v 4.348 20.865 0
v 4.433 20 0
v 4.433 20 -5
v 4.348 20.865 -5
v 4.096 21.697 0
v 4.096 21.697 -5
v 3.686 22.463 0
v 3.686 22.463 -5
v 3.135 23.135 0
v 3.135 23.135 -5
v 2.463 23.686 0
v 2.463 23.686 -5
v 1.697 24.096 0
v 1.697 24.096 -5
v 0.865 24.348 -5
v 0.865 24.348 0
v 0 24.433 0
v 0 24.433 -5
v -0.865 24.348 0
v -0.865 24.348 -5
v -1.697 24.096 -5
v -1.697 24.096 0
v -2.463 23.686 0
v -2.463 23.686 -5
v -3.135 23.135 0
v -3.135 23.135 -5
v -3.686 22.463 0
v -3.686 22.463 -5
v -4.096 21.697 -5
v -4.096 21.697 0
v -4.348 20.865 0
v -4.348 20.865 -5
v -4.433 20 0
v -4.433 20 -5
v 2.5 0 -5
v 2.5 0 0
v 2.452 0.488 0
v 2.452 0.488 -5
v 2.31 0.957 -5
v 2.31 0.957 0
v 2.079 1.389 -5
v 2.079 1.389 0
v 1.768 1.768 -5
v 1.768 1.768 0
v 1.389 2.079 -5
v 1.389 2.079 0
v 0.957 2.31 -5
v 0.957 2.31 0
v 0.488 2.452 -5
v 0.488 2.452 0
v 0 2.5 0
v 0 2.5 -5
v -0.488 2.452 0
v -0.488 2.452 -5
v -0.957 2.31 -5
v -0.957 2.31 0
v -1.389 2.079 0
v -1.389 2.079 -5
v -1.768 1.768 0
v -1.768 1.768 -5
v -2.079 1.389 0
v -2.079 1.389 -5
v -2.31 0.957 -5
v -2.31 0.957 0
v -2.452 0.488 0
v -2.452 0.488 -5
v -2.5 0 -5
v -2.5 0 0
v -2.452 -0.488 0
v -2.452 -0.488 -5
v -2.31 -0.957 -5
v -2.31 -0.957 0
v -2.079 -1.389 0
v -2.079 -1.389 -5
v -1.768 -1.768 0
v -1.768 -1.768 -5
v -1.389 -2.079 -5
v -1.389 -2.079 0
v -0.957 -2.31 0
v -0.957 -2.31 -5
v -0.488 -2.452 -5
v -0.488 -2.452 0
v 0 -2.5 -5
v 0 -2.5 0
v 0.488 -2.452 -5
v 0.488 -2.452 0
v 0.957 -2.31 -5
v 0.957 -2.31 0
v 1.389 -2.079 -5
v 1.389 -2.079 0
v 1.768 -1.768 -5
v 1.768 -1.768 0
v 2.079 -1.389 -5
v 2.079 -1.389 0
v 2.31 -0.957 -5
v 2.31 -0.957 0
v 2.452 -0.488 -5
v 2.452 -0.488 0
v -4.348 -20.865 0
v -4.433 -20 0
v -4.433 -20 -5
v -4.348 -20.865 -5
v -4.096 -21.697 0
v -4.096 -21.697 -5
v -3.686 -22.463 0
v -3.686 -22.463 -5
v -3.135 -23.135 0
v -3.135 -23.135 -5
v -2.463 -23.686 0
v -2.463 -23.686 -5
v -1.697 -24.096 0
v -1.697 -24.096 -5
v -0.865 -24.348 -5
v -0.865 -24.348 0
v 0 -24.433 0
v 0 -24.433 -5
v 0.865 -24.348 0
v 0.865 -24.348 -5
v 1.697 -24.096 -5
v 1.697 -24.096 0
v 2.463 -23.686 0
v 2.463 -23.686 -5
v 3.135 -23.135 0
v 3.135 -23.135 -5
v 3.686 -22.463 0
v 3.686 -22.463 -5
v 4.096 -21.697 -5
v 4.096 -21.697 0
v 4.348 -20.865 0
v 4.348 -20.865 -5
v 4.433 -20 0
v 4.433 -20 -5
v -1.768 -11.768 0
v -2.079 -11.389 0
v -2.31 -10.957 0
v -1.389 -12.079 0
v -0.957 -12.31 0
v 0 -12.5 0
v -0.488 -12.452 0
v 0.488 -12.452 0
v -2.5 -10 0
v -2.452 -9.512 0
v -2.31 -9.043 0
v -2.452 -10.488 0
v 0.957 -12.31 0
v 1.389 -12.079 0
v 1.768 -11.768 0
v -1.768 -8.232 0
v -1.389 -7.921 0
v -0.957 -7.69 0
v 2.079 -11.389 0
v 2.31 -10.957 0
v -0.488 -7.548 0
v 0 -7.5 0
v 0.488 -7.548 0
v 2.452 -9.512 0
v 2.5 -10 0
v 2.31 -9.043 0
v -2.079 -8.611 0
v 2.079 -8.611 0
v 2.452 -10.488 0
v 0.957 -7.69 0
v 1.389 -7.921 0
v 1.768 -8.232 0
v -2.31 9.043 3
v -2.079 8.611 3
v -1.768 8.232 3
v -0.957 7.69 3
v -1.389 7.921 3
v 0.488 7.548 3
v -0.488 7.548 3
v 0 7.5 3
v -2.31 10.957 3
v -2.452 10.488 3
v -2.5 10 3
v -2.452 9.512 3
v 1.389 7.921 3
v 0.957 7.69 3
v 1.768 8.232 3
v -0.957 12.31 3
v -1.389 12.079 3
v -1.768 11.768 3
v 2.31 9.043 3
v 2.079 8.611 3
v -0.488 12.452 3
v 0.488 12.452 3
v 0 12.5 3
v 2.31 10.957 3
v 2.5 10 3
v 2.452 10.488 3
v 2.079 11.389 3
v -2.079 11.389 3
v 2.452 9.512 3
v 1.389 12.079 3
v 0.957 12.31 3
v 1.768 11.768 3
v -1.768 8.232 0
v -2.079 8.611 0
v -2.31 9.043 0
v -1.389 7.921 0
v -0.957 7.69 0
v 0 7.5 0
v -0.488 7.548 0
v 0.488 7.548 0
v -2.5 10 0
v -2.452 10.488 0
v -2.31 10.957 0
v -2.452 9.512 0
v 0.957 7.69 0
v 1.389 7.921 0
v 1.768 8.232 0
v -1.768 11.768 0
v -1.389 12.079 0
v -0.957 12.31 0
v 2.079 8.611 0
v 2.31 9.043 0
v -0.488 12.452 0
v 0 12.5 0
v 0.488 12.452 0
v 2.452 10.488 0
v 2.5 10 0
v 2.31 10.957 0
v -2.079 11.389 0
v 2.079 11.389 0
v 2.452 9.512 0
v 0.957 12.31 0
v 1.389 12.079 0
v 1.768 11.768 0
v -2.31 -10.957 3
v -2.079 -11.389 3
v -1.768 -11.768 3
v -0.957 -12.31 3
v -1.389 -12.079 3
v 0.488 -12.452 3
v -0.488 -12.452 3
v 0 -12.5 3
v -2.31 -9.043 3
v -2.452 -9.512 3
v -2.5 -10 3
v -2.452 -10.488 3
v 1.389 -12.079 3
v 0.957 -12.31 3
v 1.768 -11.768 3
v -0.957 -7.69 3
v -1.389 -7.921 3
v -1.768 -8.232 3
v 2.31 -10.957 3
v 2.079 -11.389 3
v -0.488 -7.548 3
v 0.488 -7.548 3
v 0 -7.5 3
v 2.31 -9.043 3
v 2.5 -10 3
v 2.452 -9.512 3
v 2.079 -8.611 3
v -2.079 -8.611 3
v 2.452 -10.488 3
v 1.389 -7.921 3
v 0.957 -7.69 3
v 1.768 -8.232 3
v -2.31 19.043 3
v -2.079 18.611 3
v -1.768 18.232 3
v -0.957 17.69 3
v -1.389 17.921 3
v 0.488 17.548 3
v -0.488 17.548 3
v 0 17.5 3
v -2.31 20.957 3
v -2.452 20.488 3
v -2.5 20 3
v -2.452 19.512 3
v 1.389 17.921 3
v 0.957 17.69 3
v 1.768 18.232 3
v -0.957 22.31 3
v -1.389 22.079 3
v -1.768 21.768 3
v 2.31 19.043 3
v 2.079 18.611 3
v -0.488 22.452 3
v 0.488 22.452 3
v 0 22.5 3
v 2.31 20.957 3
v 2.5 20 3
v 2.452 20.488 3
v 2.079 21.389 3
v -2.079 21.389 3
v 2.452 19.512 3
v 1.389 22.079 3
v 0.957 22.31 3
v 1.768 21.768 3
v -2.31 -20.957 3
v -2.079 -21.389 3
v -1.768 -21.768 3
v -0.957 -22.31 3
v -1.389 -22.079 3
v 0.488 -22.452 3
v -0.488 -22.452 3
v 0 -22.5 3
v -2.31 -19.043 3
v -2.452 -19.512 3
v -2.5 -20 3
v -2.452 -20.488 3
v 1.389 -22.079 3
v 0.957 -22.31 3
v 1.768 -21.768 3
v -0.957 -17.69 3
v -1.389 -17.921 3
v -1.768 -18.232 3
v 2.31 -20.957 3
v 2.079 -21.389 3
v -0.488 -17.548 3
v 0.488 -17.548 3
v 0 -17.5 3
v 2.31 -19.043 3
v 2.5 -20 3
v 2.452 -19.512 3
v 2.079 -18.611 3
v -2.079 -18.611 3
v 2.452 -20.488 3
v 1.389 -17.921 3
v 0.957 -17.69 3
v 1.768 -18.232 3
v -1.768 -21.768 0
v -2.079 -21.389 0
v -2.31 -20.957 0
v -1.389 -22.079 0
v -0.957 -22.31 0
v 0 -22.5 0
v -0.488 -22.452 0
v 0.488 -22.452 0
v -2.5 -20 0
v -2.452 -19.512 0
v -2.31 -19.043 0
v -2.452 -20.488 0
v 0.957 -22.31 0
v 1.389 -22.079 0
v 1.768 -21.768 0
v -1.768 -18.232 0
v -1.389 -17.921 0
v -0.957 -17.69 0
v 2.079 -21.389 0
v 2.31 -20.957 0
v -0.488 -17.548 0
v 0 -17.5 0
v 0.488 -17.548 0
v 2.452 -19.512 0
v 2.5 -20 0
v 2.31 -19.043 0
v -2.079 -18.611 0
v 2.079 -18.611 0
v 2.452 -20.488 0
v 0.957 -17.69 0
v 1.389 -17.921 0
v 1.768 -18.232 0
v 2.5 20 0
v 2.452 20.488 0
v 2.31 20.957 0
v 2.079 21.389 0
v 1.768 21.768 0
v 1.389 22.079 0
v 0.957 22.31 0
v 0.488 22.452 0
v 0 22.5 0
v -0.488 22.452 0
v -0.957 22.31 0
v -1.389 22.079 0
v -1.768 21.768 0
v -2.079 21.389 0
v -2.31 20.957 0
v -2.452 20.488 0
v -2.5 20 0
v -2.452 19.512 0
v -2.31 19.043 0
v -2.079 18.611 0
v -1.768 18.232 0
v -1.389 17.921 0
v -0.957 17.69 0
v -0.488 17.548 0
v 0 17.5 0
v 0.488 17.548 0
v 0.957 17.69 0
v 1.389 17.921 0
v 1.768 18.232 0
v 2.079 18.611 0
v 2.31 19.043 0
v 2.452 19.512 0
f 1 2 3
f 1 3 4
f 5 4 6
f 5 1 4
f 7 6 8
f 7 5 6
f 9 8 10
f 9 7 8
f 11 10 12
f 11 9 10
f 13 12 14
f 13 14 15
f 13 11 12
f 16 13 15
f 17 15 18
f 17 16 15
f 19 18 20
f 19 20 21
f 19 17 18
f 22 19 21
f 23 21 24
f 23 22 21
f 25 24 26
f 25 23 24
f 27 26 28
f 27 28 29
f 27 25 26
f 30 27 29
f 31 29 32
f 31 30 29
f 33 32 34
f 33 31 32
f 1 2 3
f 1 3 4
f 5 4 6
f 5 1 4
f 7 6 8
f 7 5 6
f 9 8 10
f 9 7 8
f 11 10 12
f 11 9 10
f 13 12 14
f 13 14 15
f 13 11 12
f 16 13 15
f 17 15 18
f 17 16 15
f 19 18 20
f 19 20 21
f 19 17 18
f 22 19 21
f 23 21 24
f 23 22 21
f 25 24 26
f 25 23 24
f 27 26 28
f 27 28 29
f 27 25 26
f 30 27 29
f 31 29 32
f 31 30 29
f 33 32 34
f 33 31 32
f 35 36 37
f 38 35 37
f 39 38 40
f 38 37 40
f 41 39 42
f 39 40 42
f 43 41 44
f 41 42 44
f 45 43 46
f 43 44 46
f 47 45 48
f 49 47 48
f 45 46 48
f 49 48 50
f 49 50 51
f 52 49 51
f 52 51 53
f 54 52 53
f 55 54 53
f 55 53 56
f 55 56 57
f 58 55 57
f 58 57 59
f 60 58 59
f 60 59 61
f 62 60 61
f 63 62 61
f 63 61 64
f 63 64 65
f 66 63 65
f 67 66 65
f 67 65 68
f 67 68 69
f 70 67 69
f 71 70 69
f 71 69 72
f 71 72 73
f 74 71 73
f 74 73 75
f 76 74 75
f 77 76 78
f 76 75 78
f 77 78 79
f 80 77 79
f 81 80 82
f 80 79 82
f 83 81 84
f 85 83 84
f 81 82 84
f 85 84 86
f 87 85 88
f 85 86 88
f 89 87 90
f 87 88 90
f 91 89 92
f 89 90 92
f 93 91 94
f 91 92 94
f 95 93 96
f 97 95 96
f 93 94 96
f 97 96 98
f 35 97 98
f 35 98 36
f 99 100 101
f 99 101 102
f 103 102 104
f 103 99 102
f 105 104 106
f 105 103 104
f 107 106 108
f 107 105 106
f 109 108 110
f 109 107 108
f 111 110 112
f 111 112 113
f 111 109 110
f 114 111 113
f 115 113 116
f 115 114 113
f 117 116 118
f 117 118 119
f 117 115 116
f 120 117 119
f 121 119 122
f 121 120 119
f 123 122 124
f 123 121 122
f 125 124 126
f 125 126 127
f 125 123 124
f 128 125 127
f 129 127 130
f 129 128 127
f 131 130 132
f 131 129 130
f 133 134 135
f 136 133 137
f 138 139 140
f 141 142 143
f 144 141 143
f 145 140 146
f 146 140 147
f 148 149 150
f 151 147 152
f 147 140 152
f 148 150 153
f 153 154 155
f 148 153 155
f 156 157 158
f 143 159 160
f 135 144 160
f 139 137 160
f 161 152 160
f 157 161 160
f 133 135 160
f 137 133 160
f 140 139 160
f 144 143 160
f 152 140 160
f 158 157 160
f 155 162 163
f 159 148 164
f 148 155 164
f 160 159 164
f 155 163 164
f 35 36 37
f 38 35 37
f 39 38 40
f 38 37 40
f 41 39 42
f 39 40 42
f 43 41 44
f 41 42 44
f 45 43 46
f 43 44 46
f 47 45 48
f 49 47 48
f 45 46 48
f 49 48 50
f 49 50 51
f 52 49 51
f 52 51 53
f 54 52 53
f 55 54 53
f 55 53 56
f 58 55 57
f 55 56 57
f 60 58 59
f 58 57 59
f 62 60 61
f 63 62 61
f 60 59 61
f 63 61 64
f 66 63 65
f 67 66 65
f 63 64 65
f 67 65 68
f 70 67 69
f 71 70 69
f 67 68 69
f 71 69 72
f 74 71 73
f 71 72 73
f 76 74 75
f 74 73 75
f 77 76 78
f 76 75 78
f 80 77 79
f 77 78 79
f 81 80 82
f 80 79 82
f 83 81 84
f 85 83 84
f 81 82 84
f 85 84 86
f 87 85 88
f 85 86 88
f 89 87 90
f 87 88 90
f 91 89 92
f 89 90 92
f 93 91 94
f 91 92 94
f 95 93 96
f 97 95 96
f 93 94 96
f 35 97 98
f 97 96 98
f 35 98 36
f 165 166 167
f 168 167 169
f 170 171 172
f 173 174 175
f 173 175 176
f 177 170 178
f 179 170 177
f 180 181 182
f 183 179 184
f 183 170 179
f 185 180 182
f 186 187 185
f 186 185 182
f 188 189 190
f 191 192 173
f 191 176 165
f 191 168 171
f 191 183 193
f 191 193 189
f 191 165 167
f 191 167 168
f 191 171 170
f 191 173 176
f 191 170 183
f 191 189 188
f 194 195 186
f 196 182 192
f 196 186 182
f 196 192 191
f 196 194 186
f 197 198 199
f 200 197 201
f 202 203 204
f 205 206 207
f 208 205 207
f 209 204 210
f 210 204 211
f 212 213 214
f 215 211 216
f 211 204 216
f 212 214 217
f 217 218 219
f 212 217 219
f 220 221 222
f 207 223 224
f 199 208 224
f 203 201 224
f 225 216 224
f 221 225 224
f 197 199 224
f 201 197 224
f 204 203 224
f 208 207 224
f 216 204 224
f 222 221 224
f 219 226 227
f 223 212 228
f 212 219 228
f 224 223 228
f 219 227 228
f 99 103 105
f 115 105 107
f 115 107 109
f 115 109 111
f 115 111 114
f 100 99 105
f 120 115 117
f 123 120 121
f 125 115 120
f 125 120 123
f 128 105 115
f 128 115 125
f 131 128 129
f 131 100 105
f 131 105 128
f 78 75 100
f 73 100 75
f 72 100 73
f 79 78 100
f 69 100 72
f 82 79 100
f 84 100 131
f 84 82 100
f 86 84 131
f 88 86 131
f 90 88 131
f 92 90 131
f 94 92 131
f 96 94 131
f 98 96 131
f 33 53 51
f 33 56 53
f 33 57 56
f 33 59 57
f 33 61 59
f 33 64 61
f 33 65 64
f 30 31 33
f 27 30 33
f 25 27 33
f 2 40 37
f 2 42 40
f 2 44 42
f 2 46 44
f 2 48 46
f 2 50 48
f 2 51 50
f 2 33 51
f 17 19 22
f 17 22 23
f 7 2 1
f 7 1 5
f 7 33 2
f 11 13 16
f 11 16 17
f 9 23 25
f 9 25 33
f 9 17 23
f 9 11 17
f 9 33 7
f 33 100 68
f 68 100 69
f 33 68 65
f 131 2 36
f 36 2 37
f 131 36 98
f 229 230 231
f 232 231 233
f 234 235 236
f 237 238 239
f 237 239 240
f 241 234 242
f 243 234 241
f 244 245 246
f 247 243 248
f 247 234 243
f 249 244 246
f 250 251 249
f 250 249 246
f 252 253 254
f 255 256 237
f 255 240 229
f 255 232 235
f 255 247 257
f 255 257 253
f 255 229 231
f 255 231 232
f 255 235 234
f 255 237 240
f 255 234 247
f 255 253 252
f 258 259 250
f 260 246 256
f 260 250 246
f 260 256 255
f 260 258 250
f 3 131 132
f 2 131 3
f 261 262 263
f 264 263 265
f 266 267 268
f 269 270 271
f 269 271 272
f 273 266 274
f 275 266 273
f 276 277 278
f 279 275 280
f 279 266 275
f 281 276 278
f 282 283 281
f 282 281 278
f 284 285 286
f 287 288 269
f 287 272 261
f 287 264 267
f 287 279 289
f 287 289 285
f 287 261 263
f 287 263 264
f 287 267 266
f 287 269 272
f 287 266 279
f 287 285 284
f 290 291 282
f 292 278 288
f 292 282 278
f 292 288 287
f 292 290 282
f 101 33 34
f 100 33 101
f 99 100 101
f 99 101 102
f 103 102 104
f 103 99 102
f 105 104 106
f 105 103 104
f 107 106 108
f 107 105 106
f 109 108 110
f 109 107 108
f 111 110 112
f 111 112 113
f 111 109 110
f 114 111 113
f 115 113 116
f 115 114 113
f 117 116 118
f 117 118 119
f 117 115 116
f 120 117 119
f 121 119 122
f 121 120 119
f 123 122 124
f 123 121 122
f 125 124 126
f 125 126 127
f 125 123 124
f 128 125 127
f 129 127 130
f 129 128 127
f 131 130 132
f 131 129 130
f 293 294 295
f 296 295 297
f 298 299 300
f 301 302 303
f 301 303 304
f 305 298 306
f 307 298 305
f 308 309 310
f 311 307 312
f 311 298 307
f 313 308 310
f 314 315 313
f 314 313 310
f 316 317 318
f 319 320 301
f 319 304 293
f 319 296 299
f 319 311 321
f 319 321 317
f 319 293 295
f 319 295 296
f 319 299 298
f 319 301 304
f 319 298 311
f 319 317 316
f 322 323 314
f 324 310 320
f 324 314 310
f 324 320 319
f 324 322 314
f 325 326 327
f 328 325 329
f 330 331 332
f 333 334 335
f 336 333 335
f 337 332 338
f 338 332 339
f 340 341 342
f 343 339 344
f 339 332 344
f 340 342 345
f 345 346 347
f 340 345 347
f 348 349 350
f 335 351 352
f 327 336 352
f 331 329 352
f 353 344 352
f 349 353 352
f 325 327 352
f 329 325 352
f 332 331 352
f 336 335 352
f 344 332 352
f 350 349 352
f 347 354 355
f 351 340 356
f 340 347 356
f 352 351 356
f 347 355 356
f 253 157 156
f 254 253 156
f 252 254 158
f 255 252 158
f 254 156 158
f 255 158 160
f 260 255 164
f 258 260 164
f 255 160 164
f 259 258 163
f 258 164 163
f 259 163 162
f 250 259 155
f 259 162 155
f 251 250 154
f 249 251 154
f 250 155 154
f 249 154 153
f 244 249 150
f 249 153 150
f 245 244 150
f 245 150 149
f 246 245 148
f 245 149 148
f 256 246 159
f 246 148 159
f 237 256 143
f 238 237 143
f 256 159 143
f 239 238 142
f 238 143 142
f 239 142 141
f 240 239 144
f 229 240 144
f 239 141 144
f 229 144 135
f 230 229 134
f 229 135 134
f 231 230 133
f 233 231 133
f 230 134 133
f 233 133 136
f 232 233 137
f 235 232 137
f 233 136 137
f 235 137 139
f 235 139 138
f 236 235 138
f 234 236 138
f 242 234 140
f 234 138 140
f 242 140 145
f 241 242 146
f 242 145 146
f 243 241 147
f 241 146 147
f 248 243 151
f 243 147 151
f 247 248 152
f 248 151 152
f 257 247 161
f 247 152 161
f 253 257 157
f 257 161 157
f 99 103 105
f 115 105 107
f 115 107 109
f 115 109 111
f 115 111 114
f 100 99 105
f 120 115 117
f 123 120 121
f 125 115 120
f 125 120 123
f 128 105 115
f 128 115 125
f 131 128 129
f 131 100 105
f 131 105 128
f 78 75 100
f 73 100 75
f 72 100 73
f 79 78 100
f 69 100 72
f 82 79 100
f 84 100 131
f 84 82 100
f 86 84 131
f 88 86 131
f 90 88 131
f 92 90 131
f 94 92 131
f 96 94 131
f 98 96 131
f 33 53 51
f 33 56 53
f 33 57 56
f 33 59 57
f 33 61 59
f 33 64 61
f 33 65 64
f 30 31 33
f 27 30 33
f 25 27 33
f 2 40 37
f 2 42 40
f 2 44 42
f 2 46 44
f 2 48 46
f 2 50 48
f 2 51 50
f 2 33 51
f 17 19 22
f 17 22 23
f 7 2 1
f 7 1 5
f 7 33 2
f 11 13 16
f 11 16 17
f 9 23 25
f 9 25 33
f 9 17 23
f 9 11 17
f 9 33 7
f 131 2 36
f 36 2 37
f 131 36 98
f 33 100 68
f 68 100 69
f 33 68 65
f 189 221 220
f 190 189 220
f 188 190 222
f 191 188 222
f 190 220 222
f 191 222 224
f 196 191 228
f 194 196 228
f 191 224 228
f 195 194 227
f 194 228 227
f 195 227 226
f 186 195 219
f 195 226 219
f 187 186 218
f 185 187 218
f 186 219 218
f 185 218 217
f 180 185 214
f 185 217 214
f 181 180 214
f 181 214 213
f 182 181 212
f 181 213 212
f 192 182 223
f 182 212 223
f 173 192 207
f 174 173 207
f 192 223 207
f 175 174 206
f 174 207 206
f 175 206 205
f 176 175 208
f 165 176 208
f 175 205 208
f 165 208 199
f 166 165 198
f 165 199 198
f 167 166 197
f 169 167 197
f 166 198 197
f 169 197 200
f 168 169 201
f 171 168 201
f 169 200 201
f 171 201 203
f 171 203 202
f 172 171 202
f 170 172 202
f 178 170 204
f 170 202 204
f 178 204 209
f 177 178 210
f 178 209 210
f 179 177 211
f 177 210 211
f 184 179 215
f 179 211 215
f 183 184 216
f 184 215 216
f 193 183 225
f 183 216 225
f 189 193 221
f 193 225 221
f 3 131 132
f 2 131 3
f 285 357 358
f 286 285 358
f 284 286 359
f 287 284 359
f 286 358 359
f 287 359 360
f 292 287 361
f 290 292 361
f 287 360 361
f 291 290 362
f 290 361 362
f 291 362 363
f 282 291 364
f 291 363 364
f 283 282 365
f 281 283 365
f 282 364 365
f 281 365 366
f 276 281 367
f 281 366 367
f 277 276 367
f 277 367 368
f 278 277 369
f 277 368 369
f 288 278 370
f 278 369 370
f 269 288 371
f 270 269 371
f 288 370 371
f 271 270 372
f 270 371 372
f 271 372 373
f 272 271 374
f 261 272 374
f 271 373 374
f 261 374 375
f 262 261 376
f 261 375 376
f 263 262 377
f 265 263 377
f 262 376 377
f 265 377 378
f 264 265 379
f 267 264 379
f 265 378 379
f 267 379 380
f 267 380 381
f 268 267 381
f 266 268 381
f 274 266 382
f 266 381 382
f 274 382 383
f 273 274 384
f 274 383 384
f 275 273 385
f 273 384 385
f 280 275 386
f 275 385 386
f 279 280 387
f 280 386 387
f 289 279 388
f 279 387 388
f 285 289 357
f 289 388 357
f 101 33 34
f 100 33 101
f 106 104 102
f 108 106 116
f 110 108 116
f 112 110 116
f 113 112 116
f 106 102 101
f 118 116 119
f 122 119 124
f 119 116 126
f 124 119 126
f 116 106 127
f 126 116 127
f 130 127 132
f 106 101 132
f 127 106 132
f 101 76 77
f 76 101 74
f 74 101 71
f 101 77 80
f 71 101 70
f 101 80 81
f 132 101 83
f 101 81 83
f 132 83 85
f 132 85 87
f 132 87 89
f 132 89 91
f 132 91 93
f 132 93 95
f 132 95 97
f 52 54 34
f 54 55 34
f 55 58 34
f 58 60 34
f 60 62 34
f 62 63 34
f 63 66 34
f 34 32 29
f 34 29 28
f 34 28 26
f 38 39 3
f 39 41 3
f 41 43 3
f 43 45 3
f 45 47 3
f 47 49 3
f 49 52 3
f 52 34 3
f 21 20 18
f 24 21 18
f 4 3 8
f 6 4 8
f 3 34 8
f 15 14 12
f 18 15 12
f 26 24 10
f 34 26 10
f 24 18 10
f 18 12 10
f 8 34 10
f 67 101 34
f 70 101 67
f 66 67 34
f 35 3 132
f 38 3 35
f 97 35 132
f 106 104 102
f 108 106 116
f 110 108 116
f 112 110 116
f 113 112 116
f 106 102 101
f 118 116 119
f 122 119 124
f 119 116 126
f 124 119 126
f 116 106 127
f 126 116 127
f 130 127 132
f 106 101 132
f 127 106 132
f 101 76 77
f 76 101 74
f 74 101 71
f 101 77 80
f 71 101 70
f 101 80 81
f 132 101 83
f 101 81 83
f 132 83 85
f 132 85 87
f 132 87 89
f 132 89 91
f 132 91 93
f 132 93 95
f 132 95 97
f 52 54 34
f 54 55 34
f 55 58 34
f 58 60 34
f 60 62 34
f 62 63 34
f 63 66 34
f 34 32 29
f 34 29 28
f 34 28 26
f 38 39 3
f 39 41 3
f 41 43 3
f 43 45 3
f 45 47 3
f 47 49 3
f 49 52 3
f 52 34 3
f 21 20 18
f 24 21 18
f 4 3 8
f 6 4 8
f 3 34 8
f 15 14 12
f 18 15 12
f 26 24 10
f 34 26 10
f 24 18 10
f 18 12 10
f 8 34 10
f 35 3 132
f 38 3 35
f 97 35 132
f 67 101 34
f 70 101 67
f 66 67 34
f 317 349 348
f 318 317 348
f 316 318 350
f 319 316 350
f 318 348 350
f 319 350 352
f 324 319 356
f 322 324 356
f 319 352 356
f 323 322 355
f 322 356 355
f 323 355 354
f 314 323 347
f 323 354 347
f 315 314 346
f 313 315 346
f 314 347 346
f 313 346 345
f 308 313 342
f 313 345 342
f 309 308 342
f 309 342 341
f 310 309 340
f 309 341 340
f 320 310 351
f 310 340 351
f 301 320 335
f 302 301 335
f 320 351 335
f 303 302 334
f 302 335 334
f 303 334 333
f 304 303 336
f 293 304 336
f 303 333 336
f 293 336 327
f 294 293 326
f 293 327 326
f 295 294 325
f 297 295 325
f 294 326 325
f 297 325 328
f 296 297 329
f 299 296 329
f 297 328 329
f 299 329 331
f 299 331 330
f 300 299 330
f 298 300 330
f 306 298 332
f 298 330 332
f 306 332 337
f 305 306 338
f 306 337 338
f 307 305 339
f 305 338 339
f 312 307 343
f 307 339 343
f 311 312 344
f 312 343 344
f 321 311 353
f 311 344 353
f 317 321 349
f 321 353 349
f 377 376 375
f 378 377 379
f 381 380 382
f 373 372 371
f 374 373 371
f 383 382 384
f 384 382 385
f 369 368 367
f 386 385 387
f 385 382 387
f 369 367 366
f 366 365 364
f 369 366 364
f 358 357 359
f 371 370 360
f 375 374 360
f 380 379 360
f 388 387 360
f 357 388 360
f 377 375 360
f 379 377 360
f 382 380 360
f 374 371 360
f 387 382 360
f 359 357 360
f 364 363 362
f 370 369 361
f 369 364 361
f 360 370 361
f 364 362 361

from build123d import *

# Parameters (mm, degrees)
F0_R     = 2.5
F2_DEPTH = 5
F1_R     = 2.5
F3_R     = 2.5
F4_DEPTH = 3
F5_R     = 2.5
F6_DEPTH = 5.001


with BuildPart() as f2:
    # F0 (on Top) → F2 (new body)
    with BuildSketch(Plane.XY):
        with BuildLine():
            ThreePointArc((4.4334989042, 20), (0, 24.4334989042), (-4.4334989042, 20))
            Line((-4.4334989042, 20), (-4.4334989042, -20))
            ThreePointArc((-4.4334989042, -20), (0, -24.4334989042), (4.4334989042, -20))
            Line((4.4334989042, -20), (4.4334989042, 20))
        make_face()
        Circle(F0_R, mode=Mode.SUBTRACT)
        Circle(F0_R)
    extrude(amount=-F2_DEPTH)

    # F5 (on face) → F6 (cut, through all)
    with BuildSketch(Plane.XY):
        Circle(F5_R)
    extrude(amount=-F6_DEPTH, mode=Mode.SUBTRACT)


with BuildPart() as f2b:
    # F1 (on face) → F2, piece 2 (new body)
    with BuildSketch(Plane.XY):
        with BuildLine():
            Line((4.4334989042, -20), (4.4334989042, 20))
            ThreePointArc((4.4334989042, 20), (0, 24.4334989042), (-4.4334989042, 20))
            Line((-4.4334989042, 20), (-4.4334989042, -20))
            ThreePointArc((-4.4334989042, -20), (0, -24.4334989042), (4.4334989042, -20))
        make_face()
        Circle(F1_R, mode=Mode.SUBTRACT)
    extrude(amount=-F2_DEPTH)


with BuildPart() as f4:
    # F3 (on face) → F4 (new body)
    with BuildSketch(Plane.XY):
        with Locations((0, 10)):
            Circle(F3_R)
    extrude(amount=F4_DEPTH)


with BuildPart() as f4b:
    # F3 (on face) → F4, piece 2 (new body)
    with BuildSketch(Plane.XY):
        with Locations((0, 20)):
            Circle(F3_R)
    extrude(amount=F4_DEPTH)


with BuildPart() as f4c:
    # F3 (on face) → F4, piece 3 (new body)
    with BuildSketch(Plane.XY):
        with Locations((0, -10)):
            Circle(F3_R)
    extrude(amount=F4_DEPTH)


with BuildPart() as f4d:
    # F3 (on face) → F4, piece 4 (new body)
    with BuildSketch(Plane.XY):
        with Locations((0, -20)):
            Circle(F3_R)
    extrude(amount=F4_DEPTH)


solid = Compound([f2.part, f2b.part, f4.part, f4b.part, f4c.part, f4d.part])
